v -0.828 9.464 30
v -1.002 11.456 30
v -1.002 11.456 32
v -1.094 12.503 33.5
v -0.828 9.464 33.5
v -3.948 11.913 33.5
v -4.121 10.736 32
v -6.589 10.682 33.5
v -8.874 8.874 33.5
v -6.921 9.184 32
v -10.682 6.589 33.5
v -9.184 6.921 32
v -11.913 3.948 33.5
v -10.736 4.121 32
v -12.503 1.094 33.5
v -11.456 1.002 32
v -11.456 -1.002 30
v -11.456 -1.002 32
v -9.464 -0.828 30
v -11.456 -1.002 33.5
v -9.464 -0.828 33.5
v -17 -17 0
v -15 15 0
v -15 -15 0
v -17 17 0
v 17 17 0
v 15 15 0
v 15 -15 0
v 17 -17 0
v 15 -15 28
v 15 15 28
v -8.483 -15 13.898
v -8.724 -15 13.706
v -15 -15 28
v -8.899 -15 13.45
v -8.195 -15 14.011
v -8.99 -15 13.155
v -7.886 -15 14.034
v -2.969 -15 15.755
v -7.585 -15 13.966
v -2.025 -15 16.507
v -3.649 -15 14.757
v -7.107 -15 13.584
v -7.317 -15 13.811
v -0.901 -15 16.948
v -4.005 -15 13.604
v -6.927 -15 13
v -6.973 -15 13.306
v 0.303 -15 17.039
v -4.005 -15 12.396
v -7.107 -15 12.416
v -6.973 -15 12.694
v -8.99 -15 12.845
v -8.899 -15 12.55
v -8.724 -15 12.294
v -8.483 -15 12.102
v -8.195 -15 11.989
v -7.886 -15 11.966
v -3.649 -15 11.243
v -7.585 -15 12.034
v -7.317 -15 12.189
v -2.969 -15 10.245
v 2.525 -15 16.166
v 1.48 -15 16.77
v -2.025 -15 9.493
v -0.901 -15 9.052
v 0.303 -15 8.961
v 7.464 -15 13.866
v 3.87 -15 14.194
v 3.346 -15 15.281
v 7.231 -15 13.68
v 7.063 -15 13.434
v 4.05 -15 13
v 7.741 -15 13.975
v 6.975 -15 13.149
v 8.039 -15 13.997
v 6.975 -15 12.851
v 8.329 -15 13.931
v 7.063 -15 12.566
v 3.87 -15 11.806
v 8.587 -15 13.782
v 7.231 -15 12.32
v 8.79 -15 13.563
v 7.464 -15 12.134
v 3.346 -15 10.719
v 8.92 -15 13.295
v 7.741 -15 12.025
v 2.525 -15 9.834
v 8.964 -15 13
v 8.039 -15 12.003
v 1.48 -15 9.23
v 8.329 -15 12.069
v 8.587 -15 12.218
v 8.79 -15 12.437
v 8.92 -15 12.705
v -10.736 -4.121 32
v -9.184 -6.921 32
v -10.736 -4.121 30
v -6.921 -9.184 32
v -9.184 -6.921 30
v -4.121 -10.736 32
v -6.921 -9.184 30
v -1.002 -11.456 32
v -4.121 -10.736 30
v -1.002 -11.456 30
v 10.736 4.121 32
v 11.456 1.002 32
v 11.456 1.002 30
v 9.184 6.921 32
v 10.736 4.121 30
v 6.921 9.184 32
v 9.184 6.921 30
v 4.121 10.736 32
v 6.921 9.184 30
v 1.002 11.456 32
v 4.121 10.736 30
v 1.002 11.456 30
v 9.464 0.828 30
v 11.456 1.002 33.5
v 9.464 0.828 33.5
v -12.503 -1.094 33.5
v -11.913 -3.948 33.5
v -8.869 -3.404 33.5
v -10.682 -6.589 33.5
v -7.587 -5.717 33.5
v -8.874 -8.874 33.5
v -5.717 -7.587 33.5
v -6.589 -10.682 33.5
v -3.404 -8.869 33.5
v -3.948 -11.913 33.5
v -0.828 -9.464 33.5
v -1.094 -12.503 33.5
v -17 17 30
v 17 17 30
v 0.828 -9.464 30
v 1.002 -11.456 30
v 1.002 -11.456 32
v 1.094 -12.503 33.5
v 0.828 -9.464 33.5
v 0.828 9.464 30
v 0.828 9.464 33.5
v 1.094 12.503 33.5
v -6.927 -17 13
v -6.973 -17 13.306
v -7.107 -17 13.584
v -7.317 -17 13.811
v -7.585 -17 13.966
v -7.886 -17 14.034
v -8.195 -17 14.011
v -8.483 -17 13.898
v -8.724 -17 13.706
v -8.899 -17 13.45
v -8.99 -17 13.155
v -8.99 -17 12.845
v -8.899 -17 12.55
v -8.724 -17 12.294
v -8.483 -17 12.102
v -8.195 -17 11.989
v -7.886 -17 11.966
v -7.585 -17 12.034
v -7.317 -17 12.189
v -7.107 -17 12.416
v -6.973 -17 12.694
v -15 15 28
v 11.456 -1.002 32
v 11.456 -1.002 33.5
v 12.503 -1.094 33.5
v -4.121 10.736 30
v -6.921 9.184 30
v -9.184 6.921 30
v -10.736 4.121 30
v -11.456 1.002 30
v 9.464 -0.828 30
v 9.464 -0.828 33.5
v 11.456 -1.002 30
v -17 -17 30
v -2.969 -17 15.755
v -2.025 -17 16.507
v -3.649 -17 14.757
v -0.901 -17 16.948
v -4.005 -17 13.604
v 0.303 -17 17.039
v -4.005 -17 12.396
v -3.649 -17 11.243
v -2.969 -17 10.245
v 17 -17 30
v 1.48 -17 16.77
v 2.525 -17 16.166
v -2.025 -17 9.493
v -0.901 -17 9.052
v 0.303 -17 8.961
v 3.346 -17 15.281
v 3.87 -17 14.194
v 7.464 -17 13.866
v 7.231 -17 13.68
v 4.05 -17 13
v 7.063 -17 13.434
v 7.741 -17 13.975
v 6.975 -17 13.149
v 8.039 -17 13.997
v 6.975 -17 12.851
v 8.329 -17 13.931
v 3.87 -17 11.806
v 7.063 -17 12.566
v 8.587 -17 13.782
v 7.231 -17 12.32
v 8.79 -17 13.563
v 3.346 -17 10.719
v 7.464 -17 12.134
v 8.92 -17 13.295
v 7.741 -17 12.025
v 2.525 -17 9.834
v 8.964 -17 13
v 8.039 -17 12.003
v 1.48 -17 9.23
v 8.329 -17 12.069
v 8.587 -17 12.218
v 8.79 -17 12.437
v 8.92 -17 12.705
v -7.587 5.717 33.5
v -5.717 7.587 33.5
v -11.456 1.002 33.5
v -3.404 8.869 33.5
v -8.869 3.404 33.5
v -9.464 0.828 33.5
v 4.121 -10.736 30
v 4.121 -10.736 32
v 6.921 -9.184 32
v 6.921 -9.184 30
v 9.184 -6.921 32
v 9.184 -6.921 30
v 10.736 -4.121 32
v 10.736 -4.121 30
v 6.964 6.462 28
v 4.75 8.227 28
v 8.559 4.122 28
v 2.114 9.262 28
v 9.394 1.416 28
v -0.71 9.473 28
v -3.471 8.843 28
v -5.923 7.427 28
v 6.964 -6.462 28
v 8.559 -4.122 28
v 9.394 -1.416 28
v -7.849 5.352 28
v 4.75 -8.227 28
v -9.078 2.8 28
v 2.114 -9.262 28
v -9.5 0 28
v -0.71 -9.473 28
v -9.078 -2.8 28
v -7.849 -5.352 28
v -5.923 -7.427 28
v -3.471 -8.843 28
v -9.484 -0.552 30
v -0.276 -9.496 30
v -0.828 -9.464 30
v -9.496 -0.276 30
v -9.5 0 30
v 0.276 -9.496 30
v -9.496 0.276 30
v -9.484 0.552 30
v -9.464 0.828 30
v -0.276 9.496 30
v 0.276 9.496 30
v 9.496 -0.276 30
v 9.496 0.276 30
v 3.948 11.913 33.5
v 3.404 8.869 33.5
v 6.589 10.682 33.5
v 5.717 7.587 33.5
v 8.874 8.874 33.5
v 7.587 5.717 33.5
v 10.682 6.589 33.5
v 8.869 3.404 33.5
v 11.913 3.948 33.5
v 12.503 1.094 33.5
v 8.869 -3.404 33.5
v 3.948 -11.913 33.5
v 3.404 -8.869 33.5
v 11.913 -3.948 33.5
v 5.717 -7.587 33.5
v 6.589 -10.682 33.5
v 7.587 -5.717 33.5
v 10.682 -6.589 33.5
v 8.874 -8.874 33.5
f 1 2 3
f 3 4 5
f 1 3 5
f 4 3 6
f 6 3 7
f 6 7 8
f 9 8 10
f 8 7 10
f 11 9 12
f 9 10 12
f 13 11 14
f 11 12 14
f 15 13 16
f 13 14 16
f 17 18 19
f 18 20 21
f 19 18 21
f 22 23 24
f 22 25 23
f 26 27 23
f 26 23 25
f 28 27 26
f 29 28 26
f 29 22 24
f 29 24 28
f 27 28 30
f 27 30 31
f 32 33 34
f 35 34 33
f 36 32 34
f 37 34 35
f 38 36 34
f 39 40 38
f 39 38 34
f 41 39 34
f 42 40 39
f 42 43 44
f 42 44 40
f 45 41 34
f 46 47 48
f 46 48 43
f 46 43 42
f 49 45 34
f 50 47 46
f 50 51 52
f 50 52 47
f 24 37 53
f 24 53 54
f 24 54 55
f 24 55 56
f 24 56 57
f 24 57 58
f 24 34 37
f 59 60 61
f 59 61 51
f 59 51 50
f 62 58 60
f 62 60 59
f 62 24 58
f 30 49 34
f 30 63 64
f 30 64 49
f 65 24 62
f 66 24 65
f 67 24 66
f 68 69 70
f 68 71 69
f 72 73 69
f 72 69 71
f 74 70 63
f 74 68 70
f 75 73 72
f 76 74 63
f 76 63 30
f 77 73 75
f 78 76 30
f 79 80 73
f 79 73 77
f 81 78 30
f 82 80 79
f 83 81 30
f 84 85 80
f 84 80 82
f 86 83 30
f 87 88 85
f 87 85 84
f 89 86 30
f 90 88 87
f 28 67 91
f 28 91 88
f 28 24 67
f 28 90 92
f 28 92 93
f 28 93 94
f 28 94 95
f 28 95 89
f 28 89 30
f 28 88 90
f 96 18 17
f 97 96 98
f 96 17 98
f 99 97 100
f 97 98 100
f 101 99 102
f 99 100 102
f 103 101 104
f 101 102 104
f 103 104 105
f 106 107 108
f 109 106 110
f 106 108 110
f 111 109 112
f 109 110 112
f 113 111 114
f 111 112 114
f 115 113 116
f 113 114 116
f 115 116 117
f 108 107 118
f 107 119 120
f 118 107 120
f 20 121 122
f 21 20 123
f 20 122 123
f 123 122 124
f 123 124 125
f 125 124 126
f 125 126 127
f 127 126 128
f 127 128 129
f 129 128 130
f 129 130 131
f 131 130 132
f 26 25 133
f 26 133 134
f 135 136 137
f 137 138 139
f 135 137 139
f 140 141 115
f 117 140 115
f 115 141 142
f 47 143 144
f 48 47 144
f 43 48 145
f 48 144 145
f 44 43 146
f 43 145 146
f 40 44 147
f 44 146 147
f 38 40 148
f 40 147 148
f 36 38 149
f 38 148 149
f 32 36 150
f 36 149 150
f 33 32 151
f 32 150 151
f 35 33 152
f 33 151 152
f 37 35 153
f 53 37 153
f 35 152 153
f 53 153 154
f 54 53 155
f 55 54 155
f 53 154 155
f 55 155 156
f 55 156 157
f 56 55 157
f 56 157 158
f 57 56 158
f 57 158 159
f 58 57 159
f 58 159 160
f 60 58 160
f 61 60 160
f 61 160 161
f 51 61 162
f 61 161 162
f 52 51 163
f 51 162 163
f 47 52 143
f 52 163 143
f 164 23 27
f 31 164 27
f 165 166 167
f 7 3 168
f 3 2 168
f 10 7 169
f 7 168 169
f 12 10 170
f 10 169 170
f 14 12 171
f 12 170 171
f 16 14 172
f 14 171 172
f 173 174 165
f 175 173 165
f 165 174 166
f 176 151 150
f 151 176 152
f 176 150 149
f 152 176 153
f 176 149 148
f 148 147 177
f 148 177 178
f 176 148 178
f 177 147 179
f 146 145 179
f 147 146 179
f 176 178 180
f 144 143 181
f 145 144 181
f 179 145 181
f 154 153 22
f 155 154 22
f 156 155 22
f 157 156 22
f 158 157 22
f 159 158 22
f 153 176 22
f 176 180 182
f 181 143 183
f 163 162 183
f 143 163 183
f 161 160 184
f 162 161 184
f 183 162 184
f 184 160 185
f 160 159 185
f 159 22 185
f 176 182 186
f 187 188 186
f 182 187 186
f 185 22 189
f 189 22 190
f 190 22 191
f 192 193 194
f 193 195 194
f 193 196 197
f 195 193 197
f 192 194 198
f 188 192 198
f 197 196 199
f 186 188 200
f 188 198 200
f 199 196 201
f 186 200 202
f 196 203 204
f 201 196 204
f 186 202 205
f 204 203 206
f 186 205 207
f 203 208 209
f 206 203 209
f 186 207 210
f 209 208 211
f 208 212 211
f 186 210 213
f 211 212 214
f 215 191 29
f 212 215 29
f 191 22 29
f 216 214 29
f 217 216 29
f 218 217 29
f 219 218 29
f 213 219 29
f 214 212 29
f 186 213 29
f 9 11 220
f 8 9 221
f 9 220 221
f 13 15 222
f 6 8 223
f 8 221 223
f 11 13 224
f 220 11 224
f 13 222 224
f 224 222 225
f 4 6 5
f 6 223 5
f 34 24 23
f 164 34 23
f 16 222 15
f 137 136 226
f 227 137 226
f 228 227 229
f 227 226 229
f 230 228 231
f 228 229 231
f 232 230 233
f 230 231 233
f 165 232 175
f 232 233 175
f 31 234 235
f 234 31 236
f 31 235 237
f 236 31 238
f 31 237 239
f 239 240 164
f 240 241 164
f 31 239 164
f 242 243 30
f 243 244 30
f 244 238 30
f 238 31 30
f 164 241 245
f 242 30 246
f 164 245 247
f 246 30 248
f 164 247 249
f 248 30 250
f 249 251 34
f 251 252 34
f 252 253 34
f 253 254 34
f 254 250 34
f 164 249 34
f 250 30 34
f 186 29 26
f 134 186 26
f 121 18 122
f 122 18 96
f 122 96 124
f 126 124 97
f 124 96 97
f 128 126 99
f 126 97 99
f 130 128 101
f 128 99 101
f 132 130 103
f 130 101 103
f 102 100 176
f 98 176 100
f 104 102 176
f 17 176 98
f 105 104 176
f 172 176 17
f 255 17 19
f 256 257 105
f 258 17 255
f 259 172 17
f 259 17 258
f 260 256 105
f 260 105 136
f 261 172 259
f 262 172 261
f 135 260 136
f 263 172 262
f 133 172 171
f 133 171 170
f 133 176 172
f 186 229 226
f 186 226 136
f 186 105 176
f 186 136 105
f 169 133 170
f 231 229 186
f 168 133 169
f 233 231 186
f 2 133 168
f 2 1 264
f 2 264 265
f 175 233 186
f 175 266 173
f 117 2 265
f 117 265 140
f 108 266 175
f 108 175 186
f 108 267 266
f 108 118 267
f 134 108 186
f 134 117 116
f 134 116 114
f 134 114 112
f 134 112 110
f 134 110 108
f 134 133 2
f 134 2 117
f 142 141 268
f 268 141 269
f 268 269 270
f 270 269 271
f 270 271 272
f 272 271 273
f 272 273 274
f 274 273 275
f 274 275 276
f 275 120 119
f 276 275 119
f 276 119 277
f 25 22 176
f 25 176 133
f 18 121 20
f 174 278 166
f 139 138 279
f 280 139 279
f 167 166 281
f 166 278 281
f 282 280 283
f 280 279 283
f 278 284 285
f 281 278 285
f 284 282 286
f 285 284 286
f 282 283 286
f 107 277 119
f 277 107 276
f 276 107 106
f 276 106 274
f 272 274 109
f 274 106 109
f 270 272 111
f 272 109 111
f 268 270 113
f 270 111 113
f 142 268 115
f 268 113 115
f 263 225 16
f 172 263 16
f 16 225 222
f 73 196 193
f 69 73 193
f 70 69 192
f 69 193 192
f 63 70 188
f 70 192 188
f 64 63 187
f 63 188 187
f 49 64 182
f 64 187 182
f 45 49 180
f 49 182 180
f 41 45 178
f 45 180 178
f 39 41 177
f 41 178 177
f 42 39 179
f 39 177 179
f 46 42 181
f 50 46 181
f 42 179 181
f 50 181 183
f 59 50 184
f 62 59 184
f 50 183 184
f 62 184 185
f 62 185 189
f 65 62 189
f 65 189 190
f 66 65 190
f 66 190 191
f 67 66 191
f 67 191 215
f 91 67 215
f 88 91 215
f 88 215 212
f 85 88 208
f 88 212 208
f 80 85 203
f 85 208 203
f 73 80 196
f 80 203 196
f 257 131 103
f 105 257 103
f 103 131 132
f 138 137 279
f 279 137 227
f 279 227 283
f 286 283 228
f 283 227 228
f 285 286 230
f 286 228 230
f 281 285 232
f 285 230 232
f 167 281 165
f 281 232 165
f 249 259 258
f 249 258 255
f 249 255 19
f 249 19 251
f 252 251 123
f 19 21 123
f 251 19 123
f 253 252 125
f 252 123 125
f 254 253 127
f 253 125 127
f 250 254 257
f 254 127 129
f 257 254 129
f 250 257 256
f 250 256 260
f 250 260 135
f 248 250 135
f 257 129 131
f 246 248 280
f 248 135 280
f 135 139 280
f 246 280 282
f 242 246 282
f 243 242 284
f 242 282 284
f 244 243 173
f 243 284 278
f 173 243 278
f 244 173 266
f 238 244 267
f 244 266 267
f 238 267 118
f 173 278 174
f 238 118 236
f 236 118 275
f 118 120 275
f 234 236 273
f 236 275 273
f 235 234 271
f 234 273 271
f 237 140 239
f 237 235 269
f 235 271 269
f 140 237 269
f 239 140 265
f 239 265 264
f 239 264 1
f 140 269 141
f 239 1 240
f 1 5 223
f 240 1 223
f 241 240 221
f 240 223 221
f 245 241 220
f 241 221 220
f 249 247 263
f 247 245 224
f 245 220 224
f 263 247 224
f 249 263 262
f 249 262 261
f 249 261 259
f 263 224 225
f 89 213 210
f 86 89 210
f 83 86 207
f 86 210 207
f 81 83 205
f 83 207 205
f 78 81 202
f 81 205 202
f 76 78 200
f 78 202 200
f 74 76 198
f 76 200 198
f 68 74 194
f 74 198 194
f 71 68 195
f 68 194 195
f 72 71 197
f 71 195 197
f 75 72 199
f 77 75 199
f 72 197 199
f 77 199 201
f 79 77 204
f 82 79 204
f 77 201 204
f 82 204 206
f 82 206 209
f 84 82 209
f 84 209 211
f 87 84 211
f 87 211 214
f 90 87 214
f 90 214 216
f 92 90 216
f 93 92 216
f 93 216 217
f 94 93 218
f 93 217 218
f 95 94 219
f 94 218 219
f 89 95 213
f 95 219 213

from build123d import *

# Parameters (mm, degrees)
F0_W      = 34
F0_H      = 34
F0_W_2    = 30
F0_H_2    = 30
F1_DEPTH  = 2
F2_DEPTH  = 28
F4_W      = 34
F4_H      = 34
F4_W_2    = 30
F4_H_2    = 30
F5_DEPTH  = 2
F9_DEPTH  = 3.5
F3_R      = 4.05
F3_R_2    = 1
F3_R_3    = 1.0373308001
F10_DEPTH = 2
F11_W     = 34
F11_H     = 34
F12_DEPTH = 2


with BuildPart() as f1:
    # F0 (on Top) → F1 (new body)
    with BuildSketch(Plane.XY):
        Rectangle(F0_W, F0_H)
        Rectangle(F0_W_2, F0_H_2, mode=Mode.SUBTRACT)
        Rectangle(F0_W_2, F0_H_2)
    extrude(amount=-F1_DEPTH)

    # F0 (on Top) → F2 (join)
    with BuildSketch(Plane.XY):
        Rectangle(F0_W, F0_H)
        Rectangle(F0_W_2, F0_H_2, mode=Mode.SUBTRACT)
    extrude(amount=F2_DEPTH)

    # F4 (on face) → F5 (join)
    with BuildSketch(Plane.XY.offset(28)):
        Rectangle(F4_W, F4_H)
        Rectangle(F4_W_2, F4_H_2, mode=Mode.SUBTRACT)
        Rectangle(F4_W_2, F4_H_2)
        with BuildLine():
            ThreePointArc((11.4562390281, 1.0022910416), (11.4890545482, 0.5016229547), (11.5, 0))
            ThreePointArc((11.5, 0), (11.4890545482, -0.5016229547), (11.4562390281, -1.0022910416))
            ThreePointArc((11.4562390281, -1.0022910416), (0, -11.5), (-11.4562390281, -1.0022910416))
            ThreePointArc((-11.4562390281, -1.0022910416), (-11.5, 0), (-11.4562390281, 1.0022910416))
            ThreePointArc((-11.4562390281, 1.0022910416), (0, 11.5), (11.4562390281, 1.0022910416))
        make_face(mode=Mode.SUBTRACT)
    extrude(amount=F5_DEPTH)

    # F6 (on Front) → F7 (revolve)
    with BuildSketch(Plane.XZ):
        Polygon((-11.5, 32), (-11.5, 30), (-9.5, 30), (-9.5, 33.5), (-12.5503113073, 33.5), align=None)
        Polygon((-9.5, 30), (-11.5, 30), (-11.5, 28), (-10.5, 28), (-9.5, 28), align=None)
    revolve(axis=Axis((0, 0, 27.9606003314), (0, 0, 1)))

    # F8 (on face) → F9 (cut)
    with BuildSketch(Plane.XY.offset(33.5)):
        with BuildLine():
            Line((9.4638496319, 0.8279795561), (0, 0))
            Line((0, 0), (9.4638496319, -0.8279795561))
            ThreePointArc((9.4638496319, -0.8279795561), (9.490958105, -0.41438418), (9.5, 0))
            ThreePointArc((9.5, 0), (9.490958105, 0.41438418), (9.4638496319, 0.8279795561))
        make_face()
        with BuildLine():
            Line((-9.4638496319, -0.8279795561), (0, 0))
            Line((0, 0), (-9.4638496319, 0.8279795561))
            ThreePointArc((-9.4638496319, 0.8279795561), (-9.5, 0), (-9.4638496319, -0.8279795561))
        make_face()
        with BuildLine():
            ThreePointArc((9.5, 0), (9.490958105, -0.41438418), (9.4638496319, -0.8279795561))
            Line((9.4638496319, -0.8279795561), (11.4562390281, -1.0022910416))
            Line((11.4562390281, -1.0022910416), (12.5025535837, -1.0938317037))
            ThreePointArc((12.5025535837, -1.0938317037), (12.5383661919, -0.5474368905), (12.5503113073, 0))
            ThreePointArc((12.5503113073, 0), (12.5383661919, 0.5474368905), (12.5025535837, 1.0938317037))
            Line((12.5025535837, 1.0938317037), (11.4562390281, 1.0022910416))
            Line((11.4562390281, 1.0022910416), (9.4638496319, 0.8279795561))
            ThreePointArc((9.4638496319, 0.8279795561), (9.490958105, 0.41438418), (9.5, 0))
        make_face()
        with BuildLine():
            Line((-11.4562390281, -1.0022910416), (-9.4638496319, -0.8279795561))
            ThreePointArc((-9.4638496319, -0.8279795561), (-9.5, 0), (-9.4638496319, 0.8279795561))
            Line((-9.4638496319, 0.8279795561), (-11.4562390281, 1.0022910416))
            Line((-11.4562390281, 1.0022910416), (-12.5025535837, 1.0938317037))
            ThreePointArc((-12.5025535837, 1.0938317037), (-12.5503113073, 0), (-12.5025535837, -1.0938317037))
            Line((-12.5025535837, -1.0938317037), (-11.4562390281, -1.0022910416))
        make_face()
        with BuildLine():
            Line((1.0938317037, -12.5025535837), (0.8279795561, -9.4638496319))
            ThreePointArc((0.8279795561, -9.4638496319), (0, -9.5), (-0.8279795561, -9.4638496319))
            Line((-0.8279795561, -9.4638496319), (-1.0938317037, -12.5025535837))
            ThreePointArc((-1.0938317037, -12.5025535837), (0, -12.5503113073), (1.0938317037, -12.5025535837))
        make_face()
        with BuildLine():
            Line((-1.0938317037, 12.5025535837), (-0.8279795561, 9.4638496319))
            ThreePointArc((-0.8279795561, 9.4638496319), (0, 9.5), (0.8279795561, 9.4638496319))
            Line((0.8279795561, 9.4638496319), (1.0938317037, 12.5025535837))
            ThreePointArc((1.0938317037, 12.5025535837), (0, 12.5503113073), (-1.0938317037, 12.5025535837))
        make_face()
    extrude(amount=-F9_DEPTH, mode=Mode.SUBTRACT)

    # F3 (on face) → F10 (cut, through all)
    with BuildSketch(Plane.XZ.offset(17)):
        with Locations((0, 13)):
            Circle(F3_R)
        with Locations((7.9639680702, 13)):
            Circle(F3_R_2)
        with Locations((-7.9639680702, 13)):
            Circle(F3_R_3)
    extrude(amount=-F10_DEPTH, mode=Mode.SUBTRACT)

    # F11 (on face) → F12 (cut)
    with BuildSketch(Plane(origin=(0, 0, -2), x_dir=(1, 0, 0), z_dir=(0, 0, -1))):
        Rectangle(F11_W, F11_H)
    extrude(amount=-F12_DEPTH, mode=Mode.SUBTRACT)


solid = f1.part
